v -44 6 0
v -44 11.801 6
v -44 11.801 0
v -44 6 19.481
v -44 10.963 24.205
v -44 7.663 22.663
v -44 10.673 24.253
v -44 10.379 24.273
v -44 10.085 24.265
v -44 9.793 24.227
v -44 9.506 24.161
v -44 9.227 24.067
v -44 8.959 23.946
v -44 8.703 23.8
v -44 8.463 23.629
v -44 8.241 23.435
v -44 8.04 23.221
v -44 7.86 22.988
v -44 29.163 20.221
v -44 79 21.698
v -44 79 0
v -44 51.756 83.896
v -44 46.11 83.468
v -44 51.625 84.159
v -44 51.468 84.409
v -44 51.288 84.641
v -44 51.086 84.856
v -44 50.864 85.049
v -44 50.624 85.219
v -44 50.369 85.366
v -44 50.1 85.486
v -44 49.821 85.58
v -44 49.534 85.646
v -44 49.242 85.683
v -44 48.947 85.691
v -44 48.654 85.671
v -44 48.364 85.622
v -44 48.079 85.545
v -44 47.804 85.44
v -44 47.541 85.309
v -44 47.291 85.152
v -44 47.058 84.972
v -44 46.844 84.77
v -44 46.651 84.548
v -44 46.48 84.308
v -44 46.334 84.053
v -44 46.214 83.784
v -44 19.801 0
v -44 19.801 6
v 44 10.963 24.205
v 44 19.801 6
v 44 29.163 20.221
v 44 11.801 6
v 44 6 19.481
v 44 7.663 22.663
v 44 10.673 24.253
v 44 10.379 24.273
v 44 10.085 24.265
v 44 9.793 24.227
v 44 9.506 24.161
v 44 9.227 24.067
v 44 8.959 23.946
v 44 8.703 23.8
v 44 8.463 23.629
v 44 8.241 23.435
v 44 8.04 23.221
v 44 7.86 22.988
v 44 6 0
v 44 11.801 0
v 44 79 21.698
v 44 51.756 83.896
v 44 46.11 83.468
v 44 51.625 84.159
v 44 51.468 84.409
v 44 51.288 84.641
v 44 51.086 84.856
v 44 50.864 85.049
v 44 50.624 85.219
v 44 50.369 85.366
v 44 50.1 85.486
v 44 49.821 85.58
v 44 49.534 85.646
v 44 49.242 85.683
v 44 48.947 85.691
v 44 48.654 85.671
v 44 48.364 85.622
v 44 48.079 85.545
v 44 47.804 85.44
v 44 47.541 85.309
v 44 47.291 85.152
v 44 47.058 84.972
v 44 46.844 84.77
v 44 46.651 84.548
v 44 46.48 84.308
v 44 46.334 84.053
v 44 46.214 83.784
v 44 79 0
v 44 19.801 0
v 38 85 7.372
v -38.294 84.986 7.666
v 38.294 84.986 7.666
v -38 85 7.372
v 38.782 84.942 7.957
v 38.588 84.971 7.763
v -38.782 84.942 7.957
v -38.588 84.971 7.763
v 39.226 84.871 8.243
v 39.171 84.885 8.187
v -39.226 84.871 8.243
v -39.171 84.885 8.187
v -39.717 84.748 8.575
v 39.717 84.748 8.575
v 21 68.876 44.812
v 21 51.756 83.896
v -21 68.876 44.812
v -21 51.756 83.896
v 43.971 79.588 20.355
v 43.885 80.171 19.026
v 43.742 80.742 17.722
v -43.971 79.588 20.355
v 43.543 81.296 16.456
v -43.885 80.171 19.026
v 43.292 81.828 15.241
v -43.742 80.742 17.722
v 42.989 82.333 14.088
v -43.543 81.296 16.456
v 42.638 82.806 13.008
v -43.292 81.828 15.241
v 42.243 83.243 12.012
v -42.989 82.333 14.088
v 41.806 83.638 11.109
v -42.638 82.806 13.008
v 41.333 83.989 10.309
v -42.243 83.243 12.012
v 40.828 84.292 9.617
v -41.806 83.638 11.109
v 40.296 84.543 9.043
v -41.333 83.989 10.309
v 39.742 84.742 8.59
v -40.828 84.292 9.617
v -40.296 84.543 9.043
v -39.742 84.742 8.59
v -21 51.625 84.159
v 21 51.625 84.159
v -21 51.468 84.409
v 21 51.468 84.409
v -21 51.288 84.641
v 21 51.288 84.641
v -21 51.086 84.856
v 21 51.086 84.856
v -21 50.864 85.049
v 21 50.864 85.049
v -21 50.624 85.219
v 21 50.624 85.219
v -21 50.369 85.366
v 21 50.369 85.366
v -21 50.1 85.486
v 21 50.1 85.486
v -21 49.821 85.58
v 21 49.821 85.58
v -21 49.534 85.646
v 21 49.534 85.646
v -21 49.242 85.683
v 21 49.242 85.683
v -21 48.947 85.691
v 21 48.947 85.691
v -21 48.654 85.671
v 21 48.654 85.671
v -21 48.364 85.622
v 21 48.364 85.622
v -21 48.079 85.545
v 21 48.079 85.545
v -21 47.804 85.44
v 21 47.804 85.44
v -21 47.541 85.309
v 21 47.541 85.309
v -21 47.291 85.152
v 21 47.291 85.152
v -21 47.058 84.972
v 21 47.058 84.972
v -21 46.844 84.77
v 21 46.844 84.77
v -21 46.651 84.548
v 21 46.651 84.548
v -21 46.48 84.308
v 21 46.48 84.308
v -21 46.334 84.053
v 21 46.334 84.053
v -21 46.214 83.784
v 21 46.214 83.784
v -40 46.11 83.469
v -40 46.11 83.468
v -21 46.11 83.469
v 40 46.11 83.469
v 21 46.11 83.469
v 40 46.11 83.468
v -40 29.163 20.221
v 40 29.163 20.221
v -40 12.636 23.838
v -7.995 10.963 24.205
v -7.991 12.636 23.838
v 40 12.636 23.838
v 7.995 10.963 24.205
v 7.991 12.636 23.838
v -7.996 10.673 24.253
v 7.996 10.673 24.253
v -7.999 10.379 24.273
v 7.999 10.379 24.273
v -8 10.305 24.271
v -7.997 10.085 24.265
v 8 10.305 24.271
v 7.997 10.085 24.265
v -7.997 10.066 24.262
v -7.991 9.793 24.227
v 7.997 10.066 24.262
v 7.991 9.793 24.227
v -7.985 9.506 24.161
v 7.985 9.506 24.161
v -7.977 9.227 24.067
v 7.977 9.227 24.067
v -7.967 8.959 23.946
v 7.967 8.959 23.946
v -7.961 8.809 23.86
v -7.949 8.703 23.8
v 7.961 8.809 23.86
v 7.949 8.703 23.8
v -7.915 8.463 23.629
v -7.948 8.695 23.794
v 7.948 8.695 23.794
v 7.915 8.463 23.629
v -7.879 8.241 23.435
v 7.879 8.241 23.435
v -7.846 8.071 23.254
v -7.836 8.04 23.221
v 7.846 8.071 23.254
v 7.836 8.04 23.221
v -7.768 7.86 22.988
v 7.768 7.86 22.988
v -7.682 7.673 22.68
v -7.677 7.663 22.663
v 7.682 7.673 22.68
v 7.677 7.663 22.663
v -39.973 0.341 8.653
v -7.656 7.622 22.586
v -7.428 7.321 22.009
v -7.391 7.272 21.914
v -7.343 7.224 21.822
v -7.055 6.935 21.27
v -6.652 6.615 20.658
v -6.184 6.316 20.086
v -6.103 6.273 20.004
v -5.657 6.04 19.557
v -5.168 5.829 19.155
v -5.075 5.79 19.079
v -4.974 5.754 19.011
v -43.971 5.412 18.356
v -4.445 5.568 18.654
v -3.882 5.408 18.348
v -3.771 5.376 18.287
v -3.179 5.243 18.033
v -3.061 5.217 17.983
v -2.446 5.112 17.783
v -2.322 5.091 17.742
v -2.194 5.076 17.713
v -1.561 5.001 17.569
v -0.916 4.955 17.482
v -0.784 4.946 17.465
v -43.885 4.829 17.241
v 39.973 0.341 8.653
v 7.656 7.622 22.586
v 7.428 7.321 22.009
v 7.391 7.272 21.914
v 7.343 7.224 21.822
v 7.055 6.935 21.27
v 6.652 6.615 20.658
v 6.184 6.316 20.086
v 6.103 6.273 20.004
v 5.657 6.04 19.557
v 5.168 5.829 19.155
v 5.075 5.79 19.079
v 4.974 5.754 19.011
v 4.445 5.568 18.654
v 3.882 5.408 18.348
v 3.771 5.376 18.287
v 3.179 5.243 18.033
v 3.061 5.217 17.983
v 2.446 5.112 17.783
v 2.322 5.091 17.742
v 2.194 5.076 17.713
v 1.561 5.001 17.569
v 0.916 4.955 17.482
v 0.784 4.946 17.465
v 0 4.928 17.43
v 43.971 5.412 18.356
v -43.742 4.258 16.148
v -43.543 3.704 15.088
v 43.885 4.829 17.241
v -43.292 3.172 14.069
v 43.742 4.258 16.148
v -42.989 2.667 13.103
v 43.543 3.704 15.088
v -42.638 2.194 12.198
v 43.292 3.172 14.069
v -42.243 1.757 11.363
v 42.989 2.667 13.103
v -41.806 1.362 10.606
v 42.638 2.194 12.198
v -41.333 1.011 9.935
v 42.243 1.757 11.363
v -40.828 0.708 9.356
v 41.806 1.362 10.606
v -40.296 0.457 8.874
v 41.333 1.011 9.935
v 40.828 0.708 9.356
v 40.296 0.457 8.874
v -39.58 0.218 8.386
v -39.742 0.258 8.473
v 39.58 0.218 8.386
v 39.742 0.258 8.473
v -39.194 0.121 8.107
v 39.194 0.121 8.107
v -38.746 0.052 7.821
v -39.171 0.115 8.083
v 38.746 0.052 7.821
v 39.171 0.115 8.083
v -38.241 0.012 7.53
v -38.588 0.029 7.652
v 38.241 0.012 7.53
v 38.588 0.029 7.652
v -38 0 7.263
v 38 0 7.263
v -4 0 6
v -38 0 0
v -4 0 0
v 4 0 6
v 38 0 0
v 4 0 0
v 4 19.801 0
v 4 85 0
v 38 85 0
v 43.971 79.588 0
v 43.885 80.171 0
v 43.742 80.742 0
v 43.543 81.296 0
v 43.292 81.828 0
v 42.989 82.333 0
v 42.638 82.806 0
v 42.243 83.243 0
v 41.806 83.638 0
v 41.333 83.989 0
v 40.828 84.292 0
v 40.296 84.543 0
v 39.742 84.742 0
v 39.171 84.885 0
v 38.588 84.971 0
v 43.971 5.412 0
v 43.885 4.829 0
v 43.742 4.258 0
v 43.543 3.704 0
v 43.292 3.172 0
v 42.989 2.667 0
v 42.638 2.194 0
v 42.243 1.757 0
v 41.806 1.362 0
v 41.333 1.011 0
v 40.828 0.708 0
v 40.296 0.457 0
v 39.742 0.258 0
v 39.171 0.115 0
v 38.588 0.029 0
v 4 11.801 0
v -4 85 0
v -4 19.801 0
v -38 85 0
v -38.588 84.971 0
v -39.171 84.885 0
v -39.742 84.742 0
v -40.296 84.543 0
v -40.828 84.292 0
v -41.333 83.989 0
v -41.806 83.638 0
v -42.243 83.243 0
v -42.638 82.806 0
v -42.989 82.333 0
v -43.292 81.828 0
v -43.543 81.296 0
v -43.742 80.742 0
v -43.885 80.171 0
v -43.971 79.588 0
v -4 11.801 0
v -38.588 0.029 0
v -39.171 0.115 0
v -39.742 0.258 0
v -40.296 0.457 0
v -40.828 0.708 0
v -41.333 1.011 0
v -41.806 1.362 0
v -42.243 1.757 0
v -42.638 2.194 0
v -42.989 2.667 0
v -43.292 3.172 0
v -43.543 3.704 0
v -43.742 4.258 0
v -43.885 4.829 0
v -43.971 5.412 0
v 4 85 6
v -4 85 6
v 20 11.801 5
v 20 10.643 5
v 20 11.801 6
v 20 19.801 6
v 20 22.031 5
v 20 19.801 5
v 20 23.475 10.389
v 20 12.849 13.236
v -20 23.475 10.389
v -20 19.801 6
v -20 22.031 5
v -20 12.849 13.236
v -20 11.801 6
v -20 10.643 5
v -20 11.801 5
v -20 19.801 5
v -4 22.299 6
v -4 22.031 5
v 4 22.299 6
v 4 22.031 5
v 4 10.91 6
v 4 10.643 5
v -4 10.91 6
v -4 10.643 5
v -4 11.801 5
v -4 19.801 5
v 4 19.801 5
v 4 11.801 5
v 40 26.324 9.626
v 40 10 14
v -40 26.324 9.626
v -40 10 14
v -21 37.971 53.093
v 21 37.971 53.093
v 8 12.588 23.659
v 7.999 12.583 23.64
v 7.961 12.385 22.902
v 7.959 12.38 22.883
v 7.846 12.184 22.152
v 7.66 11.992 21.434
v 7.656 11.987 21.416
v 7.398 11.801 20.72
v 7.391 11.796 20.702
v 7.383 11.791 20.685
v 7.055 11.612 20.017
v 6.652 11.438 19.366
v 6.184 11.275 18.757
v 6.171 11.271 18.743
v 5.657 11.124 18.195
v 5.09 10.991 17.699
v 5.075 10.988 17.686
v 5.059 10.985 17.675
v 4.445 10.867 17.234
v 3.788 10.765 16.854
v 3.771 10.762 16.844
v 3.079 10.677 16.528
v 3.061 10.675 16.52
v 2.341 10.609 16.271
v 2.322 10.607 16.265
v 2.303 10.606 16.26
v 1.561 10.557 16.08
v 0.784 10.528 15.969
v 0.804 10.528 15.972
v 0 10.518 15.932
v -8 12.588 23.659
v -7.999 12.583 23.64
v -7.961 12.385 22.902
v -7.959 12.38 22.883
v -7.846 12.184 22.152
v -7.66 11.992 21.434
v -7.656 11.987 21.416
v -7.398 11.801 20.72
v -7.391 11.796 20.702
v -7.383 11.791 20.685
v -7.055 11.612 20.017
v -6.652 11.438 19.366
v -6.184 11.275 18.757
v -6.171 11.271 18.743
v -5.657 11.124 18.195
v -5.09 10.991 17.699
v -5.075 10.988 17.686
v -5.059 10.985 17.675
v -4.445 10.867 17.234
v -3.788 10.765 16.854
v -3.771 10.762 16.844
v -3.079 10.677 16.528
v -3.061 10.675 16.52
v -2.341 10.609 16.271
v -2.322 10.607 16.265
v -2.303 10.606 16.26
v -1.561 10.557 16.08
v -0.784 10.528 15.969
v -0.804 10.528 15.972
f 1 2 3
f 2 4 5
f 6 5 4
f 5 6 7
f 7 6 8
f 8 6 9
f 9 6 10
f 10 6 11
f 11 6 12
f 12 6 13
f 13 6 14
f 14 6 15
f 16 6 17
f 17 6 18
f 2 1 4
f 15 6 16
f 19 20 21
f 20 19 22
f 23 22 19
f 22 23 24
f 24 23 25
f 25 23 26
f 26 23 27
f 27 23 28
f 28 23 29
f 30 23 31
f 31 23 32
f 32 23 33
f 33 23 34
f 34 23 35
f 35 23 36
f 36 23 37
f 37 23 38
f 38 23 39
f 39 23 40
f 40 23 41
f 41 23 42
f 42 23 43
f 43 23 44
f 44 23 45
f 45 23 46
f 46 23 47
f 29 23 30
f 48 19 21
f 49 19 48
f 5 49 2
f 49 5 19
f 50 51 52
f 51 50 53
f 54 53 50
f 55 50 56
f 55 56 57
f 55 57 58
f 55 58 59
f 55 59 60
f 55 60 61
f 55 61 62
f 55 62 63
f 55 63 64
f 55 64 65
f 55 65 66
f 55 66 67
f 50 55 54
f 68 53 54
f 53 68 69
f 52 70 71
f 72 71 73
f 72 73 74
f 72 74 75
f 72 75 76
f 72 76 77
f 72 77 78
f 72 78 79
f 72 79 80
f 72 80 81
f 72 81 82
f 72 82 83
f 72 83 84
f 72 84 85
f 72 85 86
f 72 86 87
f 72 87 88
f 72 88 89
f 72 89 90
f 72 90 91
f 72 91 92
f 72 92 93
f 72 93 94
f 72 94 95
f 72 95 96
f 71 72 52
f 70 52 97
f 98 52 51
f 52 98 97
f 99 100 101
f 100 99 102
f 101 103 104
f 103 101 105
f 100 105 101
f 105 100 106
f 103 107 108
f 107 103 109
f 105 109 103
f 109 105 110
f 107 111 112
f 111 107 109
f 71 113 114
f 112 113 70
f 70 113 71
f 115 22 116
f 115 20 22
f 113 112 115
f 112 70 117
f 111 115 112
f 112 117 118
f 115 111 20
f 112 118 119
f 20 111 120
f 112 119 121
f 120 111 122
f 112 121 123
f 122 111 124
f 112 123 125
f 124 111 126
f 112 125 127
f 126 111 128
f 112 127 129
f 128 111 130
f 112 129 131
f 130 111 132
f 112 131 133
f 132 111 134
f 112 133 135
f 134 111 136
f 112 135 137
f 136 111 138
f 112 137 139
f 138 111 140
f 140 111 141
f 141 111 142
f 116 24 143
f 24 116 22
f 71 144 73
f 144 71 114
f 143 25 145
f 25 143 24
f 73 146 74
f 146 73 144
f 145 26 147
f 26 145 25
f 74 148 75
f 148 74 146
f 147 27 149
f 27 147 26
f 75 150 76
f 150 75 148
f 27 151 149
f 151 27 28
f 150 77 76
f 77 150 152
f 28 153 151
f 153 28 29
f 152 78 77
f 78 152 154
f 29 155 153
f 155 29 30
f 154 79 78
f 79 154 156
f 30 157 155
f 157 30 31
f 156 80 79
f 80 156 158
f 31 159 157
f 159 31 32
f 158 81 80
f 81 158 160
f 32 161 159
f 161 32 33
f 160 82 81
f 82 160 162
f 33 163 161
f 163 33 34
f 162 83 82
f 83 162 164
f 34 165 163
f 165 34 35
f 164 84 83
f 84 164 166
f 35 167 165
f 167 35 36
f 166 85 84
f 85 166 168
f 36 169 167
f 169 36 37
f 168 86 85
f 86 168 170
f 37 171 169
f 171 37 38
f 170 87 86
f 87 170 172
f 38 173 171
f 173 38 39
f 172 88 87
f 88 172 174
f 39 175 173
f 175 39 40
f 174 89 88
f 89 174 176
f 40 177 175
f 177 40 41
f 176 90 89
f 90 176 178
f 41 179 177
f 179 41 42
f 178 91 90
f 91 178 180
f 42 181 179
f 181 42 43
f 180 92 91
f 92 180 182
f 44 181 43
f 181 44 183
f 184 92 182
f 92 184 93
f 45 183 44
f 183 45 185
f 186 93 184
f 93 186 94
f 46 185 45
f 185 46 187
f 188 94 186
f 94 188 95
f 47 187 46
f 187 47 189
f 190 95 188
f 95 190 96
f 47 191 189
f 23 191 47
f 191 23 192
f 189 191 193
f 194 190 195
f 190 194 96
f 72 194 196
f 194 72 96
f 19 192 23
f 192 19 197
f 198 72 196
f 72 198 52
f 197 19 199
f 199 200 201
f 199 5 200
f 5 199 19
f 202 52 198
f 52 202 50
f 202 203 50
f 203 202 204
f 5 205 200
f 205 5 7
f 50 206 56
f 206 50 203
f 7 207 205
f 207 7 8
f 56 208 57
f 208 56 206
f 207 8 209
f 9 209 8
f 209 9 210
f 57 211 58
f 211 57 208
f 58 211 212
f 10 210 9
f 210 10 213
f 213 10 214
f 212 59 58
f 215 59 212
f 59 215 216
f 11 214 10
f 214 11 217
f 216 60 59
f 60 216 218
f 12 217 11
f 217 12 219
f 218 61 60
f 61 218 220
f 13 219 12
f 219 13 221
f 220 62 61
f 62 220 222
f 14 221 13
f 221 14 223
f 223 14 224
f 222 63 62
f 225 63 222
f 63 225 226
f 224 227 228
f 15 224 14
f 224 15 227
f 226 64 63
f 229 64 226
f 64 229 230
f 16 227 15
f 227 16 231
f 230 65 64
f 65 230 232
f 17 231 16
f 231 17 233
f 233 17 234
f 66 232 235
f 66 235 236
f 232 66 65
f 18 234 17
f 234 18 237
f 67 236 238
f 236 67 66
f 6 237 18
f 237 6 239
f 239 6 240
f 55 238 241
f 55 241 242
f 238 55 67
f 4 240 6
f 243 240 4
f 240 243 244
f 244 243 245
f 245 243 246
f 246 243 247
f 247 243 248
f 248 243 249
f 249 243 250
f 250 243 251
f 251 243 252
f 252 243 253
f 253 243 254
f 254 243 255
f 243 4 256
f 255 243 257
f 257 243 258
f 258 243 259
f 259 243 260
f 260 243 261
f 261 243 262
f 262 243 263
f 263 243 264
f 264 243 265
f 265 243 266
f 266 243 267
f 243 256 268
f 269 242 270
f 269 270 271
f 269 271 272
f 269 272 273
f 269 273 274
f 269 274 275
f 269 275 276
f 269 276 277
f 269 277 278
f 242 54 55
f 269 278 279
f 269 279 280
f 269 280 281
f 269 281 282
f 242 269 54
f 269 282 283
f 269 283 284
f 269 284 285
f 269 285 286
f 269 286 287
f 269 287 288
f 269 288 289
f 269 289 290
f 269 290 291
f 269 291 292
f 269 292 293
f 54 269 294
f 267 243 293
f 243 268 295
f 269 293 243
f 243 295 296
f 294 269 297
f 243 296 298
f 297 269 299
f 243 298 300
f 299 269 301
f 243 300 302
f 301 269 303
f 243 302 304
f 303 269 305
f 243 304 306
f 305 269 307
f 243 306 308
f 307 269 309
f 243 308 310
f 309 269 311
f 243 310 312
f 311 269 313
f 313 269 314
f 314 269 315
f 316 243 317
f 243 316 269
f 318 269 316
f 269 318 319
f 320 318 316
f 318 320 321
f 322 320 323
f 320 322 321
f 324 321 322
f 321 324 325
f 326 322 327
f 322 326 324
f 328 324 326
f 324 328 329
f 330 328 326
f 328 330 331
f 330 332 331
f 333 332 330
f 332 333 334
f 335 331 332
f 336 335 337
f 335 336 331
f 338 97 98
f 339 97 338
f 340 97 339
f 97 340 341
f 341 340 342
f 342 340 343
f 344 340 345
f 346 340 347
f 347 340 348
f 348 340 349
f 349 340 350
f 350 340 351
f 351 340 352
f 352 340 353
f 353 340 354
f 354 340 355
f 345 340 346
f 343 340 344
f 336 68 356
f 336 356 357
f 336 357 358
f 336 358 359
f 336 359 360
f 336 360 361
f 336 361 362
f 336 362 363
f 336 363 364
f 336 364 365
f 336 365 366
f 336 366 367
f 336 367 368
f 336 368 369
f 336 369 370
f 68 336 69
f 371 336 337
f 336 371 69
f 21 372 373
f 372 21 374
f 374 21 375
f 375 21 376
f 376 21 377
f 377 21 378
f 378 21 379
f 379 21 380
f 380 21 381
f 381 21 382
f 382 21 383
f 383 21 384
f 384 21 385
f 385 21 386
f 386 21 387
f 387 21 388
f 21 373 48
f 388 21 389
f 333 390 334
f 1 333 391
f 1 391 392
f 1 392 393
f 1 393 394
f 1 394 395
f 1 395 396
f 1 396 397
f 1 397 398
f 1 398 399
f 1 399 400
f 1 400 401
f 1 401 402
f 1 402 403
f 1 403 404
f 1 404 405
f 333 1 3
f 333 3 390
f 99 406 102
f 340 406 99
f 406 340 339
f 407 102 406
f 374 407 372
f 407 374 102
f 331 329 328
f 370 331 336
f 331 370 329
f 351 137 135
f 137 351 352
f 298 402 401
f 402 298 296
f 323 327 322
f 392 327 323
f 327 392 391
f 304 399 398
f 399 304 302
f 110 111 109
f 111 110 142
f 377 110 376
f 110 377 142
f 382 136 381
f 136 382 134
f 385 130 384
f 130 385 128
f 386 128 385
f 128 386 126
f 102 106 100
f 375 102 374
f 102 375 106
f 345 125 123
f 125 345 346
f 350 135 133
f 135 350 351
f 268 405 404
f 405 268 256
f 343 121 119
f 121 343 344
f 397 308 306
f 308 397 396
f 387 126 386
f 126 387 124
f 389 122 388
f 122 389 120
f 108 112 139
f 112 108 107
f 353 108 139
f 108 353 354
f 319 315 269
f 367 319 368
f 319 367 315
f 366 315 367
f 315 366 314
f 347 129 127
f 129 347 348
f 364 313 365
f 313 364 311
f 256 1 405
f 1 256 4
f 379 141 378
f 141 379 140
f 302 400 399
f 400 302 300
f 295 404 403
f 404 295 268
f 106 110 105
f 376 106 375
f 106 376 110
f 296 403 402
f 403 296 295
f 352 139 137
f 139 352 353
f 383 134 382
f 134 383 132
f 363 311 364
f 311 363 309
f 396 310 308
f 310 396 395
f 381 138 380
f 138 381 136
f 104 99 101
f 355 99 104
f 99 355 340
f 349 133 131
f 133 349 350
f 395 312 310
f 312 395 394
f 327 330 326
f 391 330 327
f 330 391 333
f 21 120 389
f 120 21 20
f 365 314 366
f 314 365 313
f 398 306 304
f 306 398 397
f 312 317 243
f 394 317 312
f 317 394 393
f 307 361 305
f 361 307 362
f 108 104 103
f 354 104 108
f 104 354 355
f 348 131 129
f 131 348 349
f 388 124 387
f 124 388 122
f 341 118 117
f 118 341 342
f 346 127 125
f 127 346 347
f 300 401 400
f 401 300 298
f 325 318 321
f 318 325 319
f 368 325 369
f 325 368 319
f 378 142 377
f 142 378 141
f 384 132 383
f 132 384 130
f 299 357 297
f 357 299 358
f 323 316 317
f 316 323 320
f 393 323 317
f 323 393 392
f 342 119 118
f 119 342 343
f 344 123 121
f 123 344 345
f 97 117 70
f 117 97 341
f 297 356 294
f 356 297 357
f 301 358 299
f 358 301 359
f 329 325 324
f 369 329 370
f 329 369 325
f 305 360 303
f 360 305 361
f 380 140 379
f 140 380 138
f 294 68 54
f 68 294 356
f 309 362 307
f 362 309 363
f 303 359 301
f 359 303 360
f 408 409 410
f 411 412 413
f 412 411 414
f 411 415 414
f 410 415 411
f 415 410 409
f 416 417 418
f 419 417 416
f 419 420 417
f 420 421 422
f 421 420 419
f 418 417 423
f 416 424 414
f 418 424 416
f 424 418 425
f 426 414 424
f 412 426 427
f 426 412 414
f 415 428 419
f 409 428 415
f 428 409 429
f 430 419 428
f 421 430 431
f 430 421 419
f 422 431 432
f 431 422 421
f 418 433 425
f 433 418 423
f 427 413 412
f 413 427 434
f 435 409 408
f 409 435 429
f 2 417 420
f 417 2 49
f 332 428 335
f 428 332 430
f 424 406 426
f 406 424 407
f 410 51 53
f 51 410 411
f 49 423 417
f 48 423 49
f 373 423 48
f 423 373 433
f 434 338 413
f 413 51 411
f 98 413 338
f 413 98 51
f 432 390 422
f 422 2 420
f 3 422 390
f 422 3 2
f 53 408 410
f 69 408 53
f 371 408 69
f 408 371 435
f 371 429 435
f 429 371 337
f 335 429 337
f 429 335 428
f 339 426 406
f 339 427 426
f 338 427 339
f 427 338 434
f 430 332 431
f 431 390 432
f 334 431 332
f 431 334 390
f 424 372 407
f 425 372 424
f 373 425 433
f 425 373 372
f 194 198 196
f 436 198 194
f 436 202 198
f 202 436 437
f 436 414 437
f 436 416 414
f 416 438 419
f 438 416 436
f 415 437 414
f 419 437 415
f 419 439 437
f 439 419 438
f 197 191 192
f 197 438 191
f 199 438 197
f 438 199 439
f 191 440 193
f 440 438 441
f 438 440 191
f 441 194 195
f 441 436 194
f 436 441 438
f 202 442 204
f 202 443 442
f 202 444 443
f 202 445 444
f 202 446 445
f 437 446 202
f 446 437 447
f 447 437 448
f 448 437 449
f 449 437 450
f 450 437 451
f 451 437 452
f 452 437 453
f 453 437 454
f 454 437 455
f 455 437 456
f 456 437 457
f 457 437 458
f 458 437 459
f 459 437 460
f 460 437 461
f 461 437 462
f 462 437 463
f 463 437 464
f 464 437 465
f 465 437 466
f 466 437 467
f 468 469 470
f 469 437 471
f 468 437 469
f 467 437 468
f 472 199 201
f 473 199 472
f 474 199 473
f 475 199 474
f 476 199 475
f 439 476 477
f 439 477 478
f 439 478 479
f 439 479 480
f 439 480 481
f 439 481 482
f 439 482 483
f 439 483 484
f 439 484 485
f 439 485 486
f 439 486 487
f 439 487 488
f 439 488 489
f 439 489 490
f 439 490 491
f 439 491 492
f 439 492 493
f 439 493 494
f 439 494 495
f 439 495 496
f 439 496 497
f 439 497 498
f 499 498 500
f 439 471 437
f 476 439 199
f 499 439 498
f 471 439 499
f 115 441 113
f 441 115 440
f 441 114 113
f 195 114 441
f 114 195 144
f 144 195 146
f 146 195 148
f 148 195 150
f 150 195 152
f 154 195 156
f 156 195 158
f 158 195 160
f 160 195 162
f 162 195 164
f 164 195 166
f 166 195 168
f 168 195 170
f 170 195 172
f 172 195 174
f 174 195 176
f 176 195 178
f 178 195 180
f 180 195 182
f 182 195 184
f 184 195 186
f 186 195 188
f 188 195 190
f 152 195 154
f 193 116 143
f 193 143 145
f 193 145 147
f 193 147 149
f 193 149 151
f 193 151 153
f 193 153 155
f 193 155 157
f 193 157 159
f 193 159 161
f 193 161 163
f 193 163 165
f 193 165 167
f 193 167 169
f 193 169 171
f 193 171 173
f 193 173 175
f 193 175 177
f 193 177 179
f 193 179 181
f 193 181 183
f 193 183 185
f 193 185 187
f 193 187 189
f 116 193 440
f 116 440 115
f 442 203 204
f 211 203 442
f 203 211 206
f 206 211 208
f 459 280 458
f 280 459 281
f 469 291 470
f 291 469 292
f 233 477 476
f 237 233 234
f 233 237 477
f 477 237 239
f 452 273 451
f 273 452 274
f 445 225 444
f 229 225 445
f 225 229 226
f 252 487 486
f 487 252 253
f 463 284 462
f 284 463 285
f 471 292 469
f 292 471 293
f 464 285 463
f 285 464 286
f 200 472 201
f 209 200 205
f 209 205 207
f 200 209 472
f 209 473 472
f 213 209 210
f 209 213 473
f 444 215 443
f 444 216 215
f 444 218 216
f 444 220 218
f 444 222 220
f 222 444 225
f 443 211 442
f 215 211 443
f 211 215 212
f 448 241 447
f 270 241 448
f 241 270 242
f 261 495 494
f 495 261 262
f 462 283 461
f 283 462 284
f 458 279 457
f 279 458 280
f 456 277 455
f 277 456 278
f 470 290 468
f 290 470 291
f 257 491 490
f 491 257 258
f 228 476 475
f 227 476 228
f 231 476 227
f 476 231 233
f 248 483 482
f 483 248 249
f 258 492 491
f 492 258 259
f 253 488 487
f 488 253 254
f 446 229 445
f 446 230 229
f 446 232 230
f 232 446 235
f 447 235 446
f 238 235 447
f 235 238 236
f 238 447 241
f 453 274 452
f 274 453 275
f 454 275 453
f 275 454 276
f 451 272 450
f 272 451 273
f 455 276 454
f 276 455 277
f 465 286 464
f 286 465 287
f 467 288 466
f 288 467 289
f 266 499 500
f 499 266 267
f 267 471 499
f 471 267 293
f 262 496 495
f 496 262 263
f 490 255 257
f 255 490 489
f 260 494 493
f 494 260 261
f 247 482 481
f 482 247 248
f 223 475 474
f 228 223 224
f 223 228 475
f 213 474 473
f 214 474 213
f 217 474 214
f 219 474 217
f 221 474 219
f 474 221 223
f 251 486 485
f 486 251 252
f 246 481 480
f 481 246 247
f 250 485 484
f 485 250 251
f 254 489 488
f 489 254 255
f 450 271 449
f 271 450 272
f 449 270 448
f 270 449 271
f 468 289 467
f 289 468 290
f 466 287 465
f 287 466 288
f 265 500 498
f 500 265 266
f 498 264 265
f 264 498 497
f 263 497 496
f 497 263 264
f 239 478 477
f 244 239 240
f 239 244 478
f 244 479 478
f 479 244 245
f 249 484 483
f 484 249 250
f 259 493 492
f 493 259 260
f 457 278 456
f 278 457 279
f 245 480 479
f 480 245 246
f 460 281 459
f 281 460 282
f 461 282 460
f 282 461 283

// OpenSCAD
/*
   Phone dock with a charging cable (worked example for the parametric-design skill).

   A household asked for a stand that holds one phone, with its case on, while it charges.
   What the first prints taught (each one is a parameter or a check below):
   - Measure the phone WITH its case. Take the thickest of several caliper readings and add
     `fit` per side, so the phone drops in.
   - The plug needs room under the port: about 10 mm for a magnetic L-plug, about 25 mm for a
     straight USB-C plug and its cable bend. `plug_len` says which, and an assert stops a dock
     that is too low for it (a straight plug needs floor_z = 28).
   - The wall socket moves from day to day, so the cable can leave on ALL FOUR sides.
   - Keep the underside CLOSED. Only narrow grooves for the cable. An open underside left a
     thin ring on the bed, and the front edge of the tall part lifted while it printed.
   - A ring holder or grip on the back of the case needs a window in the backrest.
   - A finger notch in the front lip makes the phone easy to take out.

   Units: mm. Front = -Y (the screen faces the person). The model sits as it prints.
   Print: standing on its base, no supports. The slot walls lean `tilt` degrees, and the
   cable grooves are short bridges.
   part = "dock" is the stand. part = "fit_test" is a thin ring of the slot (about 15 min):
   print it first and check that the phone slides through it.
*/

// === MAIN PARAMETERS (USER CUSTOMIZABLE) ===
/* [Phone, measured with its case] */
phone_w = 78.4;     // width across the screen, case on (mm)
phone_t = 15.3;     // thickness, thickest caliper reading, case on (mm)
phone_h = 160;      // length; only used for the tip-over check (mm)
fit     = 0.8;      // clearance per side (mm): 0.8 lets a cased phone drop in

/* [Cradle] */
tilt    = 15;       // lean back from vertical (degrees)
lip_h   = 10;       // front lip height above the phone's bottom edge (mm)
back_h  = 80;       // backrest length above the slot floor (mm)
wall    = 4;        // lip, backrest and side wall thickness (mm)
floor_z = 14;       // height of the slot floor's front edge above the table (mm)

/* [Base] */
base_d       = 85;  // depth, front to back (mm)
base_h       = 8;   // base slab height (mm)
front_margin = 6;   // base in front of the lip (mm)
back_foot    = 12;  // depth of the base strip that carries the backrest (mm)

/* [Cable] */
plug_w   = 40;      // plug pocket across (mm)
plug_t   = 11;      // plug pocket front to back (mm)
plug_len = 10;      // room the plug needs under the port (mm): 10 magnetic L-plug, 25 straight USB-C
groove_w = 8;       // cable groove width (mm)
groove_h = 6;       // cable groove height (mm)

/* [Back of the case] */
ring_window = true; // window in the backrest for a ring holder or grip
ring_w      = 42;   // window width (mm)
ring_from   = 45;   // window starts this far above the phone's bottom edge (mm)

/* [Looks] */
edge_r   = 3;       // rounding of the side profile (mm)
corner_r = 6;       // rounding of the plan corners (mm)
notch_r  = 8;       // finger notch radius in the front lip (mm)

/* [Print] */
part  = "dock";     // [dock, fit_test]
fit_h = 6;          // height of the fit-test ring (mm)

/* [Hidden] */
cut = 1;           // cutters reach this far past the faces they cut (no zero-thickness skins)
big = 400;          // longer than any part of the dock
$fn = $preview ? 32 : 64;

// === DERIVED VALUES ===
slot_w  = phone_w + 2 * fit;            // inside width of the slot
slot_t  = phone_t + 2 * fit;            // inside thickness of the slot
width   = slot_w + 2 * wall;            // overall width (X)
pivot_y = front_margin + wall;          // front bottom edge of the slot (Y)
pivot_z = floor_z;                      // front bottom edge of the slot (Z)
// A point in the tilted cradle frame: t = toward the back, s = up along the phone.
function cradle(t, s) = [pivot_y + t * cos(tilt) + s * sin(tilt),
                         pivot_z - t * sin(tilt) + s * cos(tilt)];
back_top   = cradle(slot_t, back_h);           // highest point of the backrest
back_rear  = cradle(slot_t + wall, back_h);    // its top rear corner
phone_cog  = cradle(slot_t / 2, phone_h / 2);  // the phone's centre of mass
port_y     = cradle(slot_t / 2, 0)[0];         // the phone's port (Y)
floor_low  = cradle(slot_t, 0)[1];             // lowest point of the slot floor (Z)
port_z     = cradle(slot_t / 2, 0)[1];         // the phone's port, above the table (Z)
groove_y   = port_y - (port_z - groove_h / 2) * tan(tilt);  // where the plug's line meets the grooves (Y)
fit_s0     = 2;                                // fit test: cut from 2 mm above the floor

// Report first: when an assert below stops the render, these numbers still come back.
echo(str("FOOTPRINT: ", width, " x ", base_d, " mm (W x D); the tool's size_mm has the height"));
echo(str("SLOT: ", slot_w, " x ", slot_t, " mm inside, for a ", phone_w, " x ", phone_t, " mm phone"));
echo(str("PORT: ", round(port_z), " mm above the table, the plug needs ", plug_len, " mm"));
echo(str("PHONE WEIGHT AT Y = ", round(phone_cog[0]), " mm of ", base_d, " mm base depth"));
echo(str("PRINT: base down, no supports. part = ", part));

// === VALIDATION ===  (eps: a check exactly at its limit must not fail on rounding)
eps = 1e-6;
assert(width <= 256 && base_d <= 256 && back_top[1] <= 256, "Bigger than the 256 mm build volume");
assert(wall >= 1.2, "Walls under 1.2 mm break");
assert(tilt >= 0 && tilt <= 30, "Lean back between 0 and 30 degrees");
assert(back_rear[0] <= base_d - edge_r, "The backrest leans past the back of the base");
assert(phone_cog[0] < base_d - 10, "The phone's weight sits behind the base: it tips over backward");
assert(plug_t <= slot_t - 4, "The plug pocket must stay inside the slot floor");
assert(plug_w <= slot_w - 2 * wall, "The plug pocket is wider than the slot allows");
assert(floor_low - groove_h >= 3 - eps, "Too little material between the slot floor and the cable grooves");
assert(port_z >= plug_len - eps, "Too low for this plug: raise floor_z (28 for a straight USB-C plug) or use an L-plug");
assert(notch_r < lip_h, "The finger notch cuts through the whole lip");
assert(!ring_window || ring_from > lip_h + 5, "The ring window starts too low");
assert(fit_s0 + fit_h <= lip_h, "The fit-test ring must stay below the top of the lip");


// === MODULES ===
// Children are placed in the tilted cradle frame (x across, y = t, z = s).
module tilted() translate([0, pivot_y, pivot_z]) rotate([-tilt, 0, 0]) children();

// Side profile in the Y-Z plane: u = Y (front to back), v = Z.
// The shapes reach below the bed and are clipped at v = 0: a flat bottom with sharp bed
// edges (a rounded bed edge curls up), rounded edges everywhere else.
module side_profile() {
    module tilted2d() translate([pivot_y, pivot_z]) rotate(-tilt) children();
    below = edge_r + 1;
    intersection() {
        square([base_d, big]);
        offset(r = edge_r) offset(delta = -edge_r) union() {
            // base + slot floor + front lip
            hull() {
                translate([0, -below]) square([base_d, base_h + below]);
                tilted2d() translate([-wall, -floor_z]) square([slot_t + 2 * wall, floor_z + lip_h]);
            }
            // backrest, carried by the back strip of the base (a sloped back)
            hull() {
                translate([base_d - back_foot, -below]) square([back_foot, base_h + below]);
                tilted2d() translate([slot_t, -floor_z]) square([wall, floor_z + back_h]);
            }
        }
    }
}

module rounded_plan(w, d, r) {
    translate([-w / 2, 0]) offset(r = r) offset(delta = -r) square([w, d]);
}

module body() {
    intersection() {
        rotate([90, 0, 90]) linear_extrude(height = width, center = true) side_profile();
        linear_extrude(height = big) rounded_plan(width, base_d, corner_r);
    }
}

module phone_slot() {
    tilted() translate([-slot_w / 2, 0, 0]) cube([slot_w, slot_t, big]);
}

// Under the phone's port, along the phone: the plug goes straight down and its cable meets the
// grooves. The pocket stops at the grooves, so the bed face stays closed except their cross.
module plug_pocket() {
    intersection() {
        tilted() translate([-plug_w / 2, slot_t / 2 - plug_t / 2, -big]) cube([plug_w, plug_t, big + cut]);
        translate([-big / 2, -big / 2, groove_h - cut]) cube(big);
    }
}

// A cross of narrow grooves in the closed underside: the cable leaves on any side.
module cable_grooves() {
    translate([-width / 2 - cut, groove_y - groove_w / 2, -cut]) cube([width + 2 * cut, groove_w, groove_h + cut]);
    translate([-groove_w / 2, -cut, -cut]) cube([groove_w, base_d + 2 * cut, groove_h + cut]);
}

module ring_window_cut() {
    if (ring_window)
        tilted() translate([-ring_w / 2, slot_t - cut, ring_from]) cube([ring_w, big, big]);
}

module finger_notch() {
    tilted() translate([0, cut, lip_h]) rotate([90, 0, 0]) cylinder(r = notch_r, h = 40);
}

module phone_dock(notch = true) {
    difference() {
        body();
        phone_slot();
        plug_pocket();
        cable_grooves();
        ring_window_cut();
        if (notch) finger_notch();
    }
}

// A thin slice of the cradle, cut square to the phone and laid flat on the bed. The cased
// phone must slide through it: a 15-minute check before the 3-hour print.
module fit_test() {
    translate([0, 0, -fit_s0]) rotate([tilt, 0, 0]) translate([0, -pivot_y, -pivot_z])
        intersection() {
            phone_dock(notch = false);
            tilted() translate([-big / 2, -wall - 3, fit_s0]) cube([big, slot_t + 2 * wall + 6, fit_h]);
        }
}

// === RENDER ===
if (part == "fit_test") fit_test();
else phone_dock();

/* Next tweaks people asked for (they are one-line parameter changes):
- A thicker case: raise `phone_t` to the new thickest reading; `fit` stays 0.8.
- A straight USB-C cable: `plug_len = 25`, `floor_z = 28` (the plug and its bend fit under the port).
- No ring holder: `ring_window = false` closes the backrest.
- A tablet: `phone_w = 180`, `phone_h = 250`, `back_h = 120`, `base_d = 120` (the asserts check it still stands).
- Cable only to the back: keep the cross anyway; it costs nothing and the socket moves.
*/
